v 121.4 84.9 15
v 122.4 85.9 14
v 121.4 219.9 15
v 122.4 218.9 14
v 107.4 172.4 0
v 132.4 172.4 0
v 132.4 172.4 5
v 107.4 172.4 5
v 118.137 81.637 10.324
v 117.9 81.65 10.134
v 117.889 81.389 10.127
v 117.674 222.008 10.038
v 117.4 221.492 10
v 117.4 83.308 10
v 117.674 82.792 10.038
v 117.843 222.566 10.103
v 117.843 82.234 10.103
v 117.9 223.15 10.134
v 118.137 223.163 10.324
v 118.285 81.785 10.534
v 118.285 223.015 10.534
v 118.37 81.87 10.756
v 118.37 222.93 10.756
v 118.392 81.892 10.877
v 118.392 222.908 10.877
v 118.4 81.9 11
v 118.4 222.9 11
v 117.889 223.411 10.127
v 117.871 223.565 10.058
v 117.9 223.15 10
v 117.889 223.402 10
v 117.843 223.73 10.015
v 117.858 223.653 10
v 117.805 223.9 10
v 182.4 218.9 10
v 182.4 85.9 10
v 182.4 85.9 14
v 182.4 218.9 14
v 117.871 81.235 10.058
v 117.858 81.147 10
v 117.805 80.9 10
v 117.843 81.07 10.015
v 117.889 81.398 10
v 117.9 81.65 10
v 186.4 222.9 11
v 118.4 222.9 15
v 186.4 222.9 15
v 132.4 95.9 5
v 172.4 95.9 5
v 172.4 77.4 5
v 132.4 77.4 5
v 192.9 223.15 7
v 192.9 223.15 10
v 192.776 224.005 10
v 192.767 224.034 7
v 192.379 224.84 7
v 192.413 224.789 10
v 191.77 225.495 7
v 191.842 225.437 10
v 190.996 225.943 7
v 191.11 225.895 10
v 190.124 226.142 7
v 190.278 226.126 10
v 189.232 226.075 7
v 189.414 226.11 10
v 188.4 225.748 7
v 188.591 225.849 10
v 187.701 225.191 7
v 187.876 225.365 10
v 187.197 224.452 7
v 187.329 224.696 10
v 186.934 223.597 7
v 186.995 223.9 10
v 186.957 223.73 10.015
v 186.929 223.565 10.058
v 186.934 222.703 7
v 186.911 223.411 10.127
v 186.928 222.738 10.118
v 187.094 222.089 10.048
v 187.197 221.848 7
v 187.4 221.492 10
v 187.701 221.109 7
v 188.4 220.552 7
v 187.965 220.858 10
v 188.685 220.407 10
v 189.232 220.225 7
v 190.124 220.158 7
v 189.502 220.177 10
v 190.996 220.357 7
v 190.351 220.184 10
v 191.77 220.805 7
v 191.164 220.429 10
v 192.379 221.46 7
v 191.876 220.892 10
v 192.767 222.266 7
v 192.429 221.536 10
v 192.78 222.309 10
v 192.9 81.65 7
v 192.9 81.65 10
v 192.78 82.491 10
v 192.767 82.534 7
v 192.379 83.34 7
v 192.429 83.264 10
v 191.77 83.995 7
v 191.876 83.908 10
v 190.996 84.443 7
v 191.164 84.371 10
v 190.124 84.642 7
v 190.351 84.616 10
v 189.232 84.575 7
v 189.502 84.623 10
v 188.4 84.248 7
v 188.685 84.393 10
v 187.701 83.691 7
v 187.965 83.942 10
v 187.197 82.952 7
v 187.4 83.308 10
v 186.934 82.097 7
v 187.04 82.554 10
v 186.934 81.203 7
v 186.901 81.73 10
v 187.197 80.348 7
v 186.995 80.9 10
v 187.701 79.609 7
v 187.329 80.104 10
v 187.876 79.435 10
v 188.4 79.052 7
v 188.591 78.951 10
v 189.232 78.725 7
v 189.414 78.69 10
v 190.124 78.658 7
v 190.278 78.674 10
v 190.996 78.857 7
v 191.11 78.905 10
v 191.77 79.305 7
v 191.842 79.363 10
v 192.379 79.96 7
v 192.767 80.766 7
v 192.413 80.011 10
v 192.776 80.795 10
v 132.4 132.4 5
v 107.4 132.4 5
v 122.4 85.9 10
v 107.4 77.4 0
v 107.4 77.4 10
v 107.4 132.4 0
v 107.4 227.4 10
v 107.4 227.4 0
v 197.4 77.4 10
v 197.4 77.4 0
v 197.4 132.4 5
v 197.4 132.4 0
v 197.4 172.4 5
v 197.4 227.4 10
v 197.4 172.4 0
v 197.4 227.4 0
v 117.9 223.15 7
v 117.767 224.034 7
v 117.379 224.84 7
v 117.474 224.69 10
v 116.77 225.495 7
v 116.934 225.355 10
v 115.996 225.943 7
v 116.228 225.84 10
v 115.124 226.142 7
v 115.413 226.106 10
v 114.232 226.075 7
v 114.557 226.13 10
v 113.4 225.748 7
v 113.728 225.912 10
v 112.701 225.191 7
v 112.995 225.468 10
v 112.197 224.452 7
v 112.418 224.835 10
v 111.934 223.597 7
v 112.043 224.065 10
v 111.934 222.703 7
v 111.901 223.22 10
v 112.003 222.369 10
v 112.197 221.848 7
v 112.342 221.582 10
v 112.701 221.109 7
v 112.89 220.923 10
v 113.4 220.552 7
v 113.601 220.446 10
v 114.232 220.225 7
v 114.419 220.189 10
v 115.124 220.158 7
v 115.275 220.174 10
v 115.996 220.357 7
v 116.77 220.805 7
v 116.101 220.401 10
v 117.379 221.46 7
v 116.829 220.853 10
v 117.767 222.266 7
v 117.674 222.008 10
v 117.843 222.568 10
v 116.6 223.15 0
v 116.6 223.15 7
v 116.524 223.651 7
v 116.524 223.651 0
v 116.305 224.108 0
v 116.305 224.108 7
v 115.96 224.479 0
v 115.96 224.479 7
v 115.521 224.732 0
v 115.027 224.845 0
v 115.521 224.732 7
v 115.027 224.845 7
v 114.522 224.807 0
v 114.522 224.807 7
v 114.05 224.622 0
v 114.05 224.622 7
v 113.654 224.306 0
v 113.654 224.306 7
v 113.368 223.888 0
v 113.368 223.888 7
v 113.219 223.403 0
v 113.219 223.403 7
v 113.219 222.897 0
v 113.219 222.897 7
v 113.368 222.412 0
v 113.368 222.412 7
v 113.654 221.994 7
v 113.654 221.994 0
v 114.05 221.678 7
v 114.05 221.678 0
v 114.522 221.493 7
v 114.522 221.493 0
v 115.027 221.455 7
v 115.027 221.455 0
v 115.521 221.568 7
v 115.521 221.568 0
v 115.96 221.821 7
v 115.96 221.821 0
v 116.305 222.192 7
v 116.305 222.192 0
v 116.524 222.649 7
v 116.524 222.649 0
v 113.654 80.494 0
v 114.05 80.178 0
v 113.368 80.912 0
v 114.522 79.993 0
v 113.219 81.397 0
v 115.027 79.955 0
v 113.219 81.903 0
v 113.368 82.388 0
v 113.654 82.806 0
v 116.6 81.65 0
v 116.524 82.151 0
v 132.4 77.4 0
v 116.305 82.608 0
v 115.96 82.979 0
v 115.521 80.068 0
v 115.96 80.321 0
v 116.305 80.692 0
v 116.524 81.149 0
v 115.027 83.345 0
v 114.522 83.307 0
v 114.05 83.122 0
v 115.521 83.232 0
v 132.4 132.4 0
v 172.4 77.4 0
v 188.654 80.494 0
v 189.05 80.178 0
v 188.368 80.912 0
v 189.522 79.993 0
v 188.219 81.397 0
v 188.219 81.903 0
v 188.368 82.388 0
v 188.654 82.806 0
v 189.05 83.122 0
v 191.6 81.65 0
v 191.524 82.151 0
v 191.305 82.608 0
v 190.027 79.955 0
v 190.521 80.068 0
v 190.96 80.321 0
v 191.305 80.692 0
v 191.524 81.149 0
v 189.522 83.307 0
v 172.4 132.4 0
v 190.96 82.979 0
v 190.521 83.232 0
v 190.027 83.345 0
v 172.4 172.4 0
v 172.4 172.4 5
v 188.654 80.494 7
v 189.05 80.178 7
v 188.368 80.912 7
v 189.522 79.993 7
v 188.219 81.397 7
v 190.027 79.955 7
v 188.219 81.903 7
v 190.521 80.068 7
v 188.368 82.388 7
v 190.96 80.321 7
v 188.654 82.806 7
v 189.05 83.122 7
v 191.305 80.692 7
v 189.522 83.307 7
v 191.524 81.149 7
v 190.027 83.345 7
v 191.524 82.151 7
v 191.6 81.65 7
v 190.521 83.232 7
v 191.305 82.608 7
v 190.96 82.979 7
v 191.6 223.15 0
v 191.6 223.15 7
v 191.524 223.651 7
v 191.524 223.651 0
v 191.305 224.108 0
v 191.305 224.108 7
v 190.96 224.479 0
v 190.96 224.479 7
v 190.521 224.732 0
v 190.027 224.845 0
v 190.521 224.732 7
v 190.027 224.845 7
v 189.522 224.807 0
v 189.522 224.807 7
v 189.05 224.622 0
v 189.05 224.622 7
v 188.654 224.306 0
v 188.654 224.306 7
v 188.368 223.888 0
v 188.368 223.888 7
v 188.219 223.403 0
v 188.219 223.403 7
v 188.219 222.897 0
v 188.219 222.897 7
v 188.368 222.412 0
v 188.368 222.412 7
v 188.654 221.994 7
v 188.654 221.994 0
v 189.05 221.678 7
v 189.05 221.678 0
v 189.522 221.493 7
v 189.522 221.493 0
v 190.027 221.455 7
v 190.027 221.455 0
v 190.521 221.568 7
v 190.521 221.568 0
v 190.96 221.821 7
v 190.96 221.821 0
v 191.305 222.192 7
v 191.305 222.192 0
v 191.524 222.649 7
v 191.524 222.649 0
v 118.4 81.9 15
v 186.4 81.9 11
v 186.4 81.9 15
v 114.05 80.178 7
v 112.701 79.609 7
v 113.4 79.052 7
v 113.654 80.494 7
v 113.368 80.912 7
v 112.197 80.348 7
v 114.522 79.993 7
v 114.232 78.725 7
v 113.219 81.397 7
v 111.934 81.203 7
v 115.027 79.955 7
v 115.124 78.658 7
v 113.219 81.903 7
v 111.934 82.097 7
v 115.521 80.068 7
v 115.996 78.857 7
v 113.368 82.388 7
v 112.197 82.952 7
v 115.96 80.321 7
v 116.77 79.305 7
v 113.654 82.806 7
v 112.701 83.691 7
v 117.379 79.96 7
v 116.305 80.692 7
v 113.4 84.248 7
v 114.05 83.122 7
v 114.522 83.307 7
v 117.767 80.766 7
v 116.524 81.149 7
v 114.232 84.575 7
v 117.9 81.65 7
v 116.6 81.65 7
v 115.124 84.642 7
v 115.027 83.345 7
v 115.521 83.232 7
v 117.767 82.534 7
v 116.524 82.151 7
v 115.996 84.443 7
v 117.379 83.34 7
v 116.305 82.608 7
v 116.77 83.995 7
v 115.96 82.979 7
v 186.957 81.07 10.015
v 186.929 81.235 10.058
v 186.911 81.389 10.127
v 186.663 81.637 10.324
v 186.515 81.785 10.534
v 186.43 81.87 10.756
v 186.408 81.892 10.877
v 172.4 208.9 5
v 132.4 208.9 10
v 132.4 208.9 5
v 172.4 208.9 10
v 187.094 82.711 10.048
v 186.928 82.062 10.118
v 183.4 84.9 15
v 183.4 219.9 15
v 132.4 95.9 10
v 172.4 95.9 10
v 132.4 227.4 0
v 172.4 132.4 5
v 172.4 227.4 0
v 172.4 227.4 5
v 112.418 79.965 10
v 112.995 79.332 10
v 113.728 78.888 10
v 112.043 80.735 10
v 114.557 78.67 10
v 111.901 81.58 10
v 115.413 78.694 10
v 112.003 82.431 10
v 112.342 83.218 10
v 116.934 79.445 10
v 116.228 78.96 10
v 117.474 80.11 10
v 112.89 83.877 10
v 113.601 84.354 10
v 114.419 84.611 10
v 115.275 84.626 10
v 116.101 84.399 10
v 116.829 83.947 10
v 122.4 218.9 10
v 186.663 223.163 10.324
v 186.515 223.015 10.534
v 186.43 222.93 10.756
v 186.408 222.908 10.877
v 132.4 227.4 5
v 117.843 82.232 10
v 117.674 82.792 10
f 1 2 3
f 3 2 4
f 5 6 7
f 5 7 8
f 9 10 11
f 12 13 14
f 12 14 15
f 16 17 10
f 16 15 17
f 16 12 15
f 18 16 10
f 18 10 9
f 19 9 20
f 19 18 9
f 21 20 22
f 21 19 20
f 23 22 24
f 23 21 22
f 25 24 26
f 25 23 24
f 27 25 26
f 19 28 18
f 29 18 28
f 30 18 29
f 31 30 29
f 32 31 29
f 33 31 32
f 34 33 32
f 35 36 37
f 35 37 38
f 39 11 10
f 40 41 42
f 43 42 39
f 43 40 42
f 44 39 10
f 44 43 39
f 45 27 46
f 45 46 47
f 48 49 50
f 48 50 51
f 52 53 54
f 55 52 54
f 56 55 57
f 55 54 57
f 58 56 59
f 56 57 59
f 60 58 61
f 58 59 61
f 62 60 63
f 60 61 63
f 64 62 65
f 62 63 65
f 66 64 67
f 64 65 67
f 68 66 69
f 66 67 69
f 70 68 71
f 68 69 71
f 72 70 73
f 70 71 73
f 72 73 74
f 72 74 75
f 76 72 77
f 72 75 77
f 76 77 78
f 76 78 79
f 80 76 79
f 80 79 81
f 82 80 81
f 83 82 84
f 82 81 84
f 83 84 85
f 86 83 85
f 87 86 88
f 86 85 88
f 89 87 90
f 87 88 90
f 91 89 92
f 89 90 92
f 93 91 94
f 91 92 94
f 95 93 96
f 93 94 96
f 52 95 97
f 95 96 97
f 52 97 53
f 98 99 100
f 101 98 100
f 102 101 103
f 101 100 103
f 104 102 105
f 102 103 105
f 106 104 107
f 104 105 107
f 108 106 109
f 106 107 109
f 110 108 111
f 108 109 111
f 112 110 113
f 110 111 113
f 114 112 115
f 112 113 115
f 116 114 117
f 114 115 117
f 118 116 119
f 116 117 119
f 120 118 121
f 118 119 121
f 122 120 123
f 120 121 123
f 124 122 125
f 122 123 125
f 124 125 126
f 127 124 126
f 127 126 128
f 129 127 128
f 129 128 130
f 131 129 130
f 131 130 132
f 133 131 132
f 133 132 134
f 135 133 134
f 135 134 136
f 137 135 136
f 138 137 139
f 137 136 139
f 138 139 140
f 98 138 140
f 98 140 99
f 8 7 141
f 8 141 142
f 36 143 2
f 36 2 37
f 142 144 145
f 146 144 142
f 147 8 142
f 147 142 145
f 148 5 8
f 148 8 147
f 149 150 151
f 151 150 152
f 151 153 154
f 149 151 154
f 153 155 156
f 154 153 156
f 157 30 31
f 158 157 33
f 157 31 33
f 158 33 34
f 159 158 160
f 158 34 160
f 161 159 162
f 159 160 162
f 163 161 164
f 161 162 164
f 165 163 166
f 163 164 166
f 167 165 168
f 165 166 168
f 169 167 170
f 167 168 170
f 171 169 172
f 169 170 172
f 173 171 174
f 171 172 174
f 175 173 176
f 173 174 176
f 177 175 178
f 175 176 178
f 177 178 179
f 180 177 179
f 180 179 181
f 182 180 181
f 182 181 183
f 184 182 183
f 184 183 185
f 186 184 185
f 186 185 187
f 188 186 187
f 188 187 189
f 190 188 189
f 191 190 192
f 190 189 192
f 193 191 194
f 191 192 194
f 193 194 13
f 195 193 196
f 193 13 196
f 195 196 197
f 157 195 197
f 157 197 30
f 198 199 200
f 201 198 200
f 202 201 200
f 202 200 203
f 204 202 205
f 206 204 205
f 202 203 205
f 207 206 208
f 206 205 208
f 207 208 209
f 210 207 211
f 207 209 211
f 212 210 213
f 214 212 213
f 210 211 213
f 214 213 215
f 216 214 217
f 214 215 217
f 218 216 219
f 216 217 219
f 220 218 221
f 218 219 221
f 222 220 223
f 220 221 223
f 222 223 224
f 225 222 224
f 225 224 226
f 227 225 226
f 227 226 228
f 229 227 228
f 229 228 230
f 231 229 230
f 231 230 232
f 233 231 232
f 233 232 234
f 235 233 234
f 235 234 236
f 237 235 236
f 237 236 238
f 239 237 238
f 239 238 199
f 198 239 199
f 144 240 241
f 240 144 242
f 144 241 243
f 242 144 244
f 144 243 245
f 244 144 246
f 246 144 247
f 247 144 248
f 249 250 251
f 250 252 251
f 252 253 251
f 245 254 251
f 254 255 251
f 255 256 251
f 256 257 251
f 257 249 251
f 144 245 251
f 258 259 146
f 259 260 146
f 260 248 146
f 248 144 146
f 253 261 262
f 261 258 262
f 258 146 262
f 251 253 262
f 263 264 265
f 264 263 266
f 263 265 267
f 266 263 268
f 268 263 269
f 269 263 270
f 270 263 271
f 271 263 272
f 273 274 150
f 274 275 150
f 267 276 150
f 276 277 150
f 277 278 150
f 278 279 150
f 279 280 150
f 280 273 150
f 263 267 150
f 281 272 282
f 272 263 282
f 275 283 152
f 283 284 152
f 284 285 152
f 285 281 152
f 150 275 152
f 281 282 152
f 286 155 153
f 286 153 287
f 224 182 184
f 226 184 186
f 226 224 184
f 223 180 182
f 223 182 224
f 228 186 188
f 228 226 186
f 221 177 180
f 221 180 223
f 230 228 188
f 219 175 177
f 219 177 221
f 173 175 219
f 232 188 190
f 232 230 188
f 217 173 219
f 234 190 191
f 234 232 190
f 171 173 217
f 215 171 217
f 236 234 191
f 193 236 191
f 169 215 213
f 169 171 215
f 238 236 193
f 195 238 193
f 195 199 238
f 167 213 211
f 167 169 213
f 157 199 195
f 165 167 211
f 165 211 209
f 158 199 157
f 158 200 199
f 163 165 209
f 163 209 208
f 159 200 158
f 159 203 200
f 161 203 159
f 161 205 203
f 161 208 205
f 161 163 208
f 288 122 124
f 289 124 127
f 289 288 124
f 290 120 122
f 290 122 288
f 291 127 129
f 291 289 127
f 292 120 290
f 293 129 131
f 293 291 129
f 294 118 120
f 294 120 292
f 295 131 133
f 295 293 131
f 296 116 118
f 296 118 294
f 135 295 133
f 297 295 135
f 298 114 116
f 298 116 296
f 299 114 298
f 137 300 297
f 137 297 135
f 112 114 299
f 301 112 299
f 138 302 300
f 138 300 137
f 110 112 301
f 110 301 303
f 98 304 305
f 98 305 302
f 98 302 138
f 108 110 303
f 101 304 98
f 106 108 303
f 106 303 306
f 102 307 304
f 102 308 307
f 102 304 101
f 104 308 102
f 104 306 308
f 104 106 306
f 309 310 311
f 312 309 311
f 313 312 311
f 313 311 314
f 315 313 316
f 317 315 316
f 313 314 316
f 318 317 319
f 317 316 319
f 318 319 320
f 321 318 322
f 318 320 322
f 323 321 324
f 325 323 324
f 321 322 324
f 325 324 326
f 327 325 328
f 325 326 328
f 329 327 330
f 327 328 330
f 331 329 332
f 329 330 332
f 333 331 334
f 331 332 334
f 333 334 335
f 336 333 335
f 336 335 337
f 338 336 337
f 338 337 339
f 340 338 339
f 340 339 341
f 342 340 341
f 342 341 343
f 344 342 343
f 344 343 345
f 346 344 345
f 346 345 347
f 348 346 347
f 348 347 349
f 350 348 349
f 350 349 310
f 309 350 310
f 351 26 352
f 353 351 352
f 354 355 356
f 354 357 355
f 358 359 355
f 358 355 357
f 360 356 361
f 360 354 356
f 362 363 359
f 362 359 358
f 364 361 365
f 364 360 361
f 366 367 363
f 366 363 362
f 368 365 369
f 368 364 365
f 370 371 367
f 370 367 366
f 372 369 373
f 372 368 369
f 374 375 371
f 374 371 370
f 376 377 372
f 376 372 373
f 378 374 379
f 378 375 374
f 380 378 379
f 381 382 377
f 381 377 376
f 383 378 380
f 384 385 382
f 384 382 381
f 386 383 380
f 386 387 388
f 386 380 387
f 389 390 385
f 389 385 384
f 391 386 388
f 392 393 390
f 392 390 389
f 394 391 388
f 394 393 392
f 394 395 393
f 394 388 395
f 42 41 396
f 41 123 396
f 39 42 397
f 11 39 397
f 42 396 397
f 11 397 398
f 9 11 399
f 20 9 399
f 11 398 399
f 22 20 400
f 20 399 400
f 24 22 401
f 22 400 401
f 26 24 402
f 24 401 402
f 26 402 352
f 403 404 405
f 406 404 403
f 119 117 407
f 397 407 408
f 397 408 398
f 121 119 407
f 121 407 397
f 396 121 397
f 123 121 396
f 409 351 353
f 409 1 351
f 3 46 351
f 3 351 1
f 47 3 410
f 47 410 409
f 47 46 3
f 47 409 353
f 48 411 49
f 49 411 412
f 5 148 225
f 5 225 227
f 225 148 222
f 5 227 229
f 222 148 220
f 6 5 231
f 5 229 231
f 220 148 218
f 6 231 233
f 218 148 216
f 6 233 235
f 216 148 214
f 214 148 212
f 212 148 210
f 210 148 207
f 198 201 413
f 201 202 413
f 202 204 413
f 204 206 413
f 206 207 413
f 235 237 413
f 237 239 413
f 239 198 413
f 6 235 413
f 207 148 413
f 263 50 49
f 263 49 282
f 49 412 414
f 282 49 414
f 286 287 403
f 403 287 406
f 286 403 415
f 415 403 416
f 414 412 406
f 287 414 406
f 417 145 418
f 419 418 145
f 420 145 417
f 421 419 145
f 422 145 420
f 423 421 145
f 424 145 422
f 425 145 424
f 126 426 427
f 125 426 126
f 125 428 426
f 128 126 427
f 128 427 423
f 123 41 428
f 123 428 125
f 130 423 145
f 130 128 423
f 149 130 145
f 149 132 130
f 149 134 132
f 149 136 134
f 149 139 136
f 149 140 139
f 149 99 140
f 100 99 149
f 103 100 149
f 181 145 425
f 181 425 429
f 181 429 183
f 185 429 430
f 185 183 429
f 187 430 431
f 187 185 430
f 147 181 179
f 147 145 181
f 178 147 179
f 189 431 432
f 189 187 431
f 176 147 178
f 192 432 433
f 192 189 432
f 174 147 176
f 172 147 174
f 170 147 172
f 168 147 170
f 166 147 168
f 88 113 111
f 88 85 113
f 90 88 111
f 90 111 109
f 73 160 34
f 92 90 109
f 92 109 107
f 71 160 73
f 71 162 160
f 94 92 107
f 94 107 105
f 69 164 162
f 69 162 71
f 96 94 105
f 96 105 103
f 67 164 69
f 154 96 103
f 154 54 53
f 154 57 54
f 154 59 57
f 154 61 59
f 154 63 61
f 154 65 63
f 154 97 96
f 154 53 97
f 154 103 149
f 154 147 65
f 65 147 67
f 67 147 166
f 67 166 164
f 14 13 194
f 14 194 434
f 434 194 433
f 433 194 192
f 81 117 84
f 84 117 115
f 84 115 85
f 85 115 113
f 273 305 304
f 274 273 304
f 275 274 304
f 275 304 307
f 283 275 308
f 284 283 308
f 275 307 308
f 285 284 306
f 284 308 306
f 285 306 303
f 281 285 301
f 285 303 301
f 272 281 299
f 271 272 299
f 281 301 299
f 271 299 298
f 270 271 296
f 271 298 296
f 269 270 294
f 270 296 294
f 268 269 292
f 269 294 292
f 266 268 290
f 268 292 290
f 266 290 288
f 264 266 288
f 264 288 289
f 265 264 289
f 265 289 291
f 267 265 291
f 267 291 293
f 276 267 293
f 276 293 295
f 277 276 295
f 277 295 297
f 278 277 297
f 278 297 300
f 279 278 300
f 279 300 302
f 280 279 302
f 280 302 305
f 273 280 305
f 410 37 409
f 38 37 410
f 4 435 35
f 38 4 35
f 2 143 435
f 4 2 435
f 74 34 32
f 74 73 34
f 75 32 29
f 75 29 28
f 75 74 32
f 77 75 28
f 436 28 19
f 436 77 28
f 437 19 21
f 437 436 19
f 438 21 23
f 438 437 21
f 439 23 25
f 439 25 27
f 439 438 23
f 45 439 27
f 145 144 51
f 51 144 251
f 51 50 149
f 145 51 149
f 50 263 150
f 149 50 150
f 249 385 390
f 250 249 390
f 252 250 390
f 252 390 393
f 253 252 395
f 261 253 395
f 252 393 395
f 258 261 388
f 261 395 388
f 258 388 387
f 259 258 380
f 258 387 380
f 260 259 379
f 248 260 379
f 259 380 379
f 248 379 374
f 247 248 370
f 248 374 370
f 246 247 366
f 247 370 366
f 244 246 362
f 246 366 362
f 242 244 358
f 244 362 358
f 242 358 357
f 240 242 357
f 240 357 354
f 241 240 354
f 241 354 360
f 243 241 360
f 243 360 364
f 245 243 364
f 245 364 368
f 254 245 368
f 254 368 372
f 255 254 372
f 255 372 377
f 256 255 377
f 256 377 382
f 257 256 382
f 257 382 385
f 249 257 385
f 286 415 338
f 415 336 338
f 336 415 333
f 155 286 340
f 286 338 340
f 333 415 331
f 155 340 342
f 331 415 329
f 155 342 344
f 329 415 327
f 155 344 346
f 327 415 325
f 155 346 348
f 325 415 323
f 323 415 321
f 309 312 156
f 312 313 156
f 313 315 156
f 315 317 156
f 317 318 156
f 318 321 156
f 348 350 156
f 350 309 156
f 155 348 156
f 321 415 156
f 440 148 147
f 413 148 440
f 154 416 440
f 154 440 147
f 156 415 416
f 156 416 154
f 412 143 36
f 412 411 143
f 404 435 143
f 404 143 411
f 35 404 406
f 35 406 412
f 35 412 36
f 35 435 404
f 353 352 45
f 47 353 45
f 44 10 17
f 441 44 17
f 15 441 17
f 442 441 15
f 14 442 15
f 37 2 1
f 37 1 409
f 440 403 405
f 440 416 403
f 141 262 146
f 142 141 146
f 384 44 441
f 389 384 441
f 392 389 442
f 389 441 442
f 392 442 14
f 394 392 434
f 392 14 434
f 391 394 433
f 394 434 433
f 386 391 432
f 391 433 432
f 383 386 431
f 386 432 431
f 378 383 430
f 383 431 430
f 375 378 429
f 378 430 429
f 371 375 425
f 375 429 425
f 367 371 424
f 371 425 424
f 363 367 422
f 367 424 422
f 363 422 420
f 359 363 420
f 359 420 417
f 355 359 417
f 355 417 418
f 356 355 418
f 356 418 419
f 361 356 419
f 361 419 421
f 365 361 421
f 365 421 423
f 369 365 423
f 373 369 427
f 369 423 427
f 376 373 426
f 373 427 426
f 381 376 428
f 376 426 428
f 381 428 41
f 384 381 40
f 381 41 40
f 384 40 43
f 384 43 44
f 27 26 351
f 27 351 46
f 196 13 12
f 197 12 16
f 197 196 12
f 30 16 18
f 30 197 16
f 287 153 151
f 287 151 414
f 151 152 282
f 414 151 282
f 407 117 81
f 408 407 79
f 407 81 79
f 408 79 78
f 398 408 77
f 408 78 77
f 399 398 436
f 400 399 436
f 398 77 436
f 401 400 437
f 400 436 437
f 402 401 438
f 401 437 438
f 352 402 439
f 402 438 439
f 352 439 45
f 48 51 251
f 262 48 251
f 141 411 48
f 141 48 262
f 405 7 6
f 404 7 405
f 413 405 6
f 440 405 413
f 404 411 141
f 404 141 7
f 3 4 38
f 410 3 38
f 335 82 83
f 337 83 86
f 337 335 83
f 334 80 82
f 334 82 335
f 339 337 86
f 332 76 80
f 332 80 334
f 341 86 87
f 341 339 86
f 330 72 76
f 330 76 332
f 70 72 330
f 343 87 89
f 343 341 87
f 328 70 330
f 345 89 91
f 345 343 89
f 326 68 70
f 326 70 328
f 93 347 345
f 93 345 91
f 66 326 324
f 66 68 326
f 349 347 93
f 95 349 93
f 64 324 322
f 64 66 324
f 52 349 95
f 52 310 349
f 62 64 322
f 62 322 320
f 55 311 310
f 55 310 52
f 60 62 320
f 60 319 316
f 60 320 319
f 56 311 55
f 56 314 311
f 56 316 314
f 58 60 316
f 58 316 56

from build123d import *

# Parameters (mm, degrees)
SKETCH1_W           = 90
SKETCH1_H           = 150
BOSS_EXTRUDE1_DEPTH = 10
SKETCH2_W           = 40
SKETCH2_H           = 183.962493804
SKETCH2_W_2         = 287.968551507
SKETCH2_H_2         = 40
CUT_EXTRUDE2_DEPTH  = 5
SKETCH3_R           = 1.7
CUT_EXTRUDE3_DEPTH  = 12
SKETCH4_W           = 68
SKETCH4_H           = 141
SKETCH4_W_2         = 60
SKETCH4_H_2         = 133
BOSS_EXTRUDE2_DEPTH = 5
FILLET1_R           = 1
CHAMFER1_SIZE       = 1
SKETCH5_W           = 40
SKETCH5_H           = 113
CUT_EXTRUDE4_DEPTH  = 10
SKETCH6_R           = 3
SKETCH6_R_2         = 1.7
CUT_EXTRUDE5_DEPTH  = 3


with BuildPart() as part:
    # Sketch1 → Boss-Extrude1 (new body)
    with BuildSketch(Plane.XY):
        with Locations((152.4, 152.4)):
            Rectangle(SKETCH1_W, SKETCH1_H)
    extrude(amount=BOSS_EXTRUDE1_DEPTH)

    # Sketch2 → Cut-Extrude2 (cut)
    with BuildSketch(Plane(origin=(0, 0, 0), x_dir=(-1, 0, 0), z_dir=(0, 0, -1))):
        Polygon((-287.968551507, 162.4), (-287.968551507, 142.4), (-162.4, 142.4), (-162.4, 60.313941127), (-142.4, 60.313941127), (-142.4, 142.4), (0, 142.4), (0, 162.4), (-142.4, 162.4), (-142.4, 244.276434931), (-162.4, 244.276434931), (-162.4, 162.4), align=None)
        with Locations((-152.4, 152.295188029)):
            Rectangle(SKETCH2_W, SKETCH2_H)
        with Locations((-143.984275754, 152.4)):
            Rectangle(SKETCH2_W_2, SKETCH2_H_2)
    extrude(amount=-CUT_EXTRUDE2_DEPTH, mode=Mode.SUBTRACT)

    # Sketch3 → Cut-Extrude3 (cut)
    with BuildSketch(Plane.XY.offset(10)):
        with Locations((189.9, 81.65)):
            Circle(SKETCH3_R)
        with Locations((189.9, 223.15)):
            Circle(SKETCH3_R)
        with Locations((114.9, 223.15)):
            Circle(SKETCH3_R)
        with Locations((114.9, 81.65)):
            Circle(SKETCH3_R)
    extrude(amount=-CUT_EXTRUDE3_DEPTH, mode=Mode.SUBTRACT)

    # Sketch4 → Boss-Extrude2 (add)
    with BuildSketch(Plane.XY.offset(10)):
        with Locations((152.4, 152.4)):
            Rectangle(SKETCH4_W, SKETCH4_H)
        with Locations((152.4, 152.4)):
            Rectangle(SKETCH4_W_2, SKETCH4_H_2, mode=Mode.SUBTRACT)
    extrude(amount=BOSS_EXTRUDE2_DEPTH)

    # Fillet1
    fillet1_edges = [part.edges().sort_by_distance(p)[0] for p in [
        (118.4, 152.4, 10),
        (152.4, 81.9, 10),
        (186.4, 152.4, 10),
        (152.4, 222.9, 10),
    ]]
    fillet(fillet1_edges, radius=FILLET1_R)

    # Chamfer1
    chamfer1_edges = [part.edges().sort_by_distance(p)[0] for p in [
        (152.4, 85.9, 15),
        (182.4, 152.4, 15),
        (152.4, 218.9, 15),
        (122.4, 152.4, 15),
    ]]
    chamfer(chamfer1_edges, length=CHAMFER1_SIZE)

    # Sketch5 → Cut-Extrude4 (cut)
    with BuildSketch(Plane.XY.offset(10)):
        with Locations((152.4, 152.4)):
            Rectangle(SKETCH5_W, SKETCH5_H)
    extrude(amount=-CUT_EXTRUDE4_DEPTH, mode=Mode.SUBTRACT)

    # Sketch6 → Cut-Extrude5 (cut, symmetric)
    # profile 1 of 4: a face of its own
    with BuildSketch(Plane.XY.offset(10)):
        with Locations((114.9, 223.15)):
            Circle(SKETCH6_R)
        with Locations((114.9, 223.15)):
            Circle(SKETCH6_R_2, mode=Mode.SUBTRACT)
    # profile 2 of 4: a face of its own
    with BuildSketch(Plane.XY.offset(10)):
        with Locations((114.9, 81.65)):
            Circle(SKETCH6_R)
        with Locations((114.9, 81.65)):
            Circle(SKETCH6_R_2, mode=Mode.SUBTRACT)
    # profile 3 of 4: a face of its own
    with BuildSketch(Plane.XY.offset(10)):
        with Locations((189.9, 81.65)):
            Circle(SKETCH6_R)
        with Locations((189.9, 81.65)):
            Circle(SKETCH6_R_2, mode=Mode.SUBTRACT)
    # profile 4 of 4: a face of its own
    with BuildSketch(Plane.XY.offset(10)):
        with Locations((189.9, 223.15)):
            Circle(SKETCH6_R)
        with Locations((189.9, 223.15)):
            Circle(SKETCH6_R_2, mode=Mode.SUBTRACT)
    extrude(amount=CUT_EXTRUDE5_DEPTH, both=True, mode=Mode.SUBTRACT)


solid = part.part
